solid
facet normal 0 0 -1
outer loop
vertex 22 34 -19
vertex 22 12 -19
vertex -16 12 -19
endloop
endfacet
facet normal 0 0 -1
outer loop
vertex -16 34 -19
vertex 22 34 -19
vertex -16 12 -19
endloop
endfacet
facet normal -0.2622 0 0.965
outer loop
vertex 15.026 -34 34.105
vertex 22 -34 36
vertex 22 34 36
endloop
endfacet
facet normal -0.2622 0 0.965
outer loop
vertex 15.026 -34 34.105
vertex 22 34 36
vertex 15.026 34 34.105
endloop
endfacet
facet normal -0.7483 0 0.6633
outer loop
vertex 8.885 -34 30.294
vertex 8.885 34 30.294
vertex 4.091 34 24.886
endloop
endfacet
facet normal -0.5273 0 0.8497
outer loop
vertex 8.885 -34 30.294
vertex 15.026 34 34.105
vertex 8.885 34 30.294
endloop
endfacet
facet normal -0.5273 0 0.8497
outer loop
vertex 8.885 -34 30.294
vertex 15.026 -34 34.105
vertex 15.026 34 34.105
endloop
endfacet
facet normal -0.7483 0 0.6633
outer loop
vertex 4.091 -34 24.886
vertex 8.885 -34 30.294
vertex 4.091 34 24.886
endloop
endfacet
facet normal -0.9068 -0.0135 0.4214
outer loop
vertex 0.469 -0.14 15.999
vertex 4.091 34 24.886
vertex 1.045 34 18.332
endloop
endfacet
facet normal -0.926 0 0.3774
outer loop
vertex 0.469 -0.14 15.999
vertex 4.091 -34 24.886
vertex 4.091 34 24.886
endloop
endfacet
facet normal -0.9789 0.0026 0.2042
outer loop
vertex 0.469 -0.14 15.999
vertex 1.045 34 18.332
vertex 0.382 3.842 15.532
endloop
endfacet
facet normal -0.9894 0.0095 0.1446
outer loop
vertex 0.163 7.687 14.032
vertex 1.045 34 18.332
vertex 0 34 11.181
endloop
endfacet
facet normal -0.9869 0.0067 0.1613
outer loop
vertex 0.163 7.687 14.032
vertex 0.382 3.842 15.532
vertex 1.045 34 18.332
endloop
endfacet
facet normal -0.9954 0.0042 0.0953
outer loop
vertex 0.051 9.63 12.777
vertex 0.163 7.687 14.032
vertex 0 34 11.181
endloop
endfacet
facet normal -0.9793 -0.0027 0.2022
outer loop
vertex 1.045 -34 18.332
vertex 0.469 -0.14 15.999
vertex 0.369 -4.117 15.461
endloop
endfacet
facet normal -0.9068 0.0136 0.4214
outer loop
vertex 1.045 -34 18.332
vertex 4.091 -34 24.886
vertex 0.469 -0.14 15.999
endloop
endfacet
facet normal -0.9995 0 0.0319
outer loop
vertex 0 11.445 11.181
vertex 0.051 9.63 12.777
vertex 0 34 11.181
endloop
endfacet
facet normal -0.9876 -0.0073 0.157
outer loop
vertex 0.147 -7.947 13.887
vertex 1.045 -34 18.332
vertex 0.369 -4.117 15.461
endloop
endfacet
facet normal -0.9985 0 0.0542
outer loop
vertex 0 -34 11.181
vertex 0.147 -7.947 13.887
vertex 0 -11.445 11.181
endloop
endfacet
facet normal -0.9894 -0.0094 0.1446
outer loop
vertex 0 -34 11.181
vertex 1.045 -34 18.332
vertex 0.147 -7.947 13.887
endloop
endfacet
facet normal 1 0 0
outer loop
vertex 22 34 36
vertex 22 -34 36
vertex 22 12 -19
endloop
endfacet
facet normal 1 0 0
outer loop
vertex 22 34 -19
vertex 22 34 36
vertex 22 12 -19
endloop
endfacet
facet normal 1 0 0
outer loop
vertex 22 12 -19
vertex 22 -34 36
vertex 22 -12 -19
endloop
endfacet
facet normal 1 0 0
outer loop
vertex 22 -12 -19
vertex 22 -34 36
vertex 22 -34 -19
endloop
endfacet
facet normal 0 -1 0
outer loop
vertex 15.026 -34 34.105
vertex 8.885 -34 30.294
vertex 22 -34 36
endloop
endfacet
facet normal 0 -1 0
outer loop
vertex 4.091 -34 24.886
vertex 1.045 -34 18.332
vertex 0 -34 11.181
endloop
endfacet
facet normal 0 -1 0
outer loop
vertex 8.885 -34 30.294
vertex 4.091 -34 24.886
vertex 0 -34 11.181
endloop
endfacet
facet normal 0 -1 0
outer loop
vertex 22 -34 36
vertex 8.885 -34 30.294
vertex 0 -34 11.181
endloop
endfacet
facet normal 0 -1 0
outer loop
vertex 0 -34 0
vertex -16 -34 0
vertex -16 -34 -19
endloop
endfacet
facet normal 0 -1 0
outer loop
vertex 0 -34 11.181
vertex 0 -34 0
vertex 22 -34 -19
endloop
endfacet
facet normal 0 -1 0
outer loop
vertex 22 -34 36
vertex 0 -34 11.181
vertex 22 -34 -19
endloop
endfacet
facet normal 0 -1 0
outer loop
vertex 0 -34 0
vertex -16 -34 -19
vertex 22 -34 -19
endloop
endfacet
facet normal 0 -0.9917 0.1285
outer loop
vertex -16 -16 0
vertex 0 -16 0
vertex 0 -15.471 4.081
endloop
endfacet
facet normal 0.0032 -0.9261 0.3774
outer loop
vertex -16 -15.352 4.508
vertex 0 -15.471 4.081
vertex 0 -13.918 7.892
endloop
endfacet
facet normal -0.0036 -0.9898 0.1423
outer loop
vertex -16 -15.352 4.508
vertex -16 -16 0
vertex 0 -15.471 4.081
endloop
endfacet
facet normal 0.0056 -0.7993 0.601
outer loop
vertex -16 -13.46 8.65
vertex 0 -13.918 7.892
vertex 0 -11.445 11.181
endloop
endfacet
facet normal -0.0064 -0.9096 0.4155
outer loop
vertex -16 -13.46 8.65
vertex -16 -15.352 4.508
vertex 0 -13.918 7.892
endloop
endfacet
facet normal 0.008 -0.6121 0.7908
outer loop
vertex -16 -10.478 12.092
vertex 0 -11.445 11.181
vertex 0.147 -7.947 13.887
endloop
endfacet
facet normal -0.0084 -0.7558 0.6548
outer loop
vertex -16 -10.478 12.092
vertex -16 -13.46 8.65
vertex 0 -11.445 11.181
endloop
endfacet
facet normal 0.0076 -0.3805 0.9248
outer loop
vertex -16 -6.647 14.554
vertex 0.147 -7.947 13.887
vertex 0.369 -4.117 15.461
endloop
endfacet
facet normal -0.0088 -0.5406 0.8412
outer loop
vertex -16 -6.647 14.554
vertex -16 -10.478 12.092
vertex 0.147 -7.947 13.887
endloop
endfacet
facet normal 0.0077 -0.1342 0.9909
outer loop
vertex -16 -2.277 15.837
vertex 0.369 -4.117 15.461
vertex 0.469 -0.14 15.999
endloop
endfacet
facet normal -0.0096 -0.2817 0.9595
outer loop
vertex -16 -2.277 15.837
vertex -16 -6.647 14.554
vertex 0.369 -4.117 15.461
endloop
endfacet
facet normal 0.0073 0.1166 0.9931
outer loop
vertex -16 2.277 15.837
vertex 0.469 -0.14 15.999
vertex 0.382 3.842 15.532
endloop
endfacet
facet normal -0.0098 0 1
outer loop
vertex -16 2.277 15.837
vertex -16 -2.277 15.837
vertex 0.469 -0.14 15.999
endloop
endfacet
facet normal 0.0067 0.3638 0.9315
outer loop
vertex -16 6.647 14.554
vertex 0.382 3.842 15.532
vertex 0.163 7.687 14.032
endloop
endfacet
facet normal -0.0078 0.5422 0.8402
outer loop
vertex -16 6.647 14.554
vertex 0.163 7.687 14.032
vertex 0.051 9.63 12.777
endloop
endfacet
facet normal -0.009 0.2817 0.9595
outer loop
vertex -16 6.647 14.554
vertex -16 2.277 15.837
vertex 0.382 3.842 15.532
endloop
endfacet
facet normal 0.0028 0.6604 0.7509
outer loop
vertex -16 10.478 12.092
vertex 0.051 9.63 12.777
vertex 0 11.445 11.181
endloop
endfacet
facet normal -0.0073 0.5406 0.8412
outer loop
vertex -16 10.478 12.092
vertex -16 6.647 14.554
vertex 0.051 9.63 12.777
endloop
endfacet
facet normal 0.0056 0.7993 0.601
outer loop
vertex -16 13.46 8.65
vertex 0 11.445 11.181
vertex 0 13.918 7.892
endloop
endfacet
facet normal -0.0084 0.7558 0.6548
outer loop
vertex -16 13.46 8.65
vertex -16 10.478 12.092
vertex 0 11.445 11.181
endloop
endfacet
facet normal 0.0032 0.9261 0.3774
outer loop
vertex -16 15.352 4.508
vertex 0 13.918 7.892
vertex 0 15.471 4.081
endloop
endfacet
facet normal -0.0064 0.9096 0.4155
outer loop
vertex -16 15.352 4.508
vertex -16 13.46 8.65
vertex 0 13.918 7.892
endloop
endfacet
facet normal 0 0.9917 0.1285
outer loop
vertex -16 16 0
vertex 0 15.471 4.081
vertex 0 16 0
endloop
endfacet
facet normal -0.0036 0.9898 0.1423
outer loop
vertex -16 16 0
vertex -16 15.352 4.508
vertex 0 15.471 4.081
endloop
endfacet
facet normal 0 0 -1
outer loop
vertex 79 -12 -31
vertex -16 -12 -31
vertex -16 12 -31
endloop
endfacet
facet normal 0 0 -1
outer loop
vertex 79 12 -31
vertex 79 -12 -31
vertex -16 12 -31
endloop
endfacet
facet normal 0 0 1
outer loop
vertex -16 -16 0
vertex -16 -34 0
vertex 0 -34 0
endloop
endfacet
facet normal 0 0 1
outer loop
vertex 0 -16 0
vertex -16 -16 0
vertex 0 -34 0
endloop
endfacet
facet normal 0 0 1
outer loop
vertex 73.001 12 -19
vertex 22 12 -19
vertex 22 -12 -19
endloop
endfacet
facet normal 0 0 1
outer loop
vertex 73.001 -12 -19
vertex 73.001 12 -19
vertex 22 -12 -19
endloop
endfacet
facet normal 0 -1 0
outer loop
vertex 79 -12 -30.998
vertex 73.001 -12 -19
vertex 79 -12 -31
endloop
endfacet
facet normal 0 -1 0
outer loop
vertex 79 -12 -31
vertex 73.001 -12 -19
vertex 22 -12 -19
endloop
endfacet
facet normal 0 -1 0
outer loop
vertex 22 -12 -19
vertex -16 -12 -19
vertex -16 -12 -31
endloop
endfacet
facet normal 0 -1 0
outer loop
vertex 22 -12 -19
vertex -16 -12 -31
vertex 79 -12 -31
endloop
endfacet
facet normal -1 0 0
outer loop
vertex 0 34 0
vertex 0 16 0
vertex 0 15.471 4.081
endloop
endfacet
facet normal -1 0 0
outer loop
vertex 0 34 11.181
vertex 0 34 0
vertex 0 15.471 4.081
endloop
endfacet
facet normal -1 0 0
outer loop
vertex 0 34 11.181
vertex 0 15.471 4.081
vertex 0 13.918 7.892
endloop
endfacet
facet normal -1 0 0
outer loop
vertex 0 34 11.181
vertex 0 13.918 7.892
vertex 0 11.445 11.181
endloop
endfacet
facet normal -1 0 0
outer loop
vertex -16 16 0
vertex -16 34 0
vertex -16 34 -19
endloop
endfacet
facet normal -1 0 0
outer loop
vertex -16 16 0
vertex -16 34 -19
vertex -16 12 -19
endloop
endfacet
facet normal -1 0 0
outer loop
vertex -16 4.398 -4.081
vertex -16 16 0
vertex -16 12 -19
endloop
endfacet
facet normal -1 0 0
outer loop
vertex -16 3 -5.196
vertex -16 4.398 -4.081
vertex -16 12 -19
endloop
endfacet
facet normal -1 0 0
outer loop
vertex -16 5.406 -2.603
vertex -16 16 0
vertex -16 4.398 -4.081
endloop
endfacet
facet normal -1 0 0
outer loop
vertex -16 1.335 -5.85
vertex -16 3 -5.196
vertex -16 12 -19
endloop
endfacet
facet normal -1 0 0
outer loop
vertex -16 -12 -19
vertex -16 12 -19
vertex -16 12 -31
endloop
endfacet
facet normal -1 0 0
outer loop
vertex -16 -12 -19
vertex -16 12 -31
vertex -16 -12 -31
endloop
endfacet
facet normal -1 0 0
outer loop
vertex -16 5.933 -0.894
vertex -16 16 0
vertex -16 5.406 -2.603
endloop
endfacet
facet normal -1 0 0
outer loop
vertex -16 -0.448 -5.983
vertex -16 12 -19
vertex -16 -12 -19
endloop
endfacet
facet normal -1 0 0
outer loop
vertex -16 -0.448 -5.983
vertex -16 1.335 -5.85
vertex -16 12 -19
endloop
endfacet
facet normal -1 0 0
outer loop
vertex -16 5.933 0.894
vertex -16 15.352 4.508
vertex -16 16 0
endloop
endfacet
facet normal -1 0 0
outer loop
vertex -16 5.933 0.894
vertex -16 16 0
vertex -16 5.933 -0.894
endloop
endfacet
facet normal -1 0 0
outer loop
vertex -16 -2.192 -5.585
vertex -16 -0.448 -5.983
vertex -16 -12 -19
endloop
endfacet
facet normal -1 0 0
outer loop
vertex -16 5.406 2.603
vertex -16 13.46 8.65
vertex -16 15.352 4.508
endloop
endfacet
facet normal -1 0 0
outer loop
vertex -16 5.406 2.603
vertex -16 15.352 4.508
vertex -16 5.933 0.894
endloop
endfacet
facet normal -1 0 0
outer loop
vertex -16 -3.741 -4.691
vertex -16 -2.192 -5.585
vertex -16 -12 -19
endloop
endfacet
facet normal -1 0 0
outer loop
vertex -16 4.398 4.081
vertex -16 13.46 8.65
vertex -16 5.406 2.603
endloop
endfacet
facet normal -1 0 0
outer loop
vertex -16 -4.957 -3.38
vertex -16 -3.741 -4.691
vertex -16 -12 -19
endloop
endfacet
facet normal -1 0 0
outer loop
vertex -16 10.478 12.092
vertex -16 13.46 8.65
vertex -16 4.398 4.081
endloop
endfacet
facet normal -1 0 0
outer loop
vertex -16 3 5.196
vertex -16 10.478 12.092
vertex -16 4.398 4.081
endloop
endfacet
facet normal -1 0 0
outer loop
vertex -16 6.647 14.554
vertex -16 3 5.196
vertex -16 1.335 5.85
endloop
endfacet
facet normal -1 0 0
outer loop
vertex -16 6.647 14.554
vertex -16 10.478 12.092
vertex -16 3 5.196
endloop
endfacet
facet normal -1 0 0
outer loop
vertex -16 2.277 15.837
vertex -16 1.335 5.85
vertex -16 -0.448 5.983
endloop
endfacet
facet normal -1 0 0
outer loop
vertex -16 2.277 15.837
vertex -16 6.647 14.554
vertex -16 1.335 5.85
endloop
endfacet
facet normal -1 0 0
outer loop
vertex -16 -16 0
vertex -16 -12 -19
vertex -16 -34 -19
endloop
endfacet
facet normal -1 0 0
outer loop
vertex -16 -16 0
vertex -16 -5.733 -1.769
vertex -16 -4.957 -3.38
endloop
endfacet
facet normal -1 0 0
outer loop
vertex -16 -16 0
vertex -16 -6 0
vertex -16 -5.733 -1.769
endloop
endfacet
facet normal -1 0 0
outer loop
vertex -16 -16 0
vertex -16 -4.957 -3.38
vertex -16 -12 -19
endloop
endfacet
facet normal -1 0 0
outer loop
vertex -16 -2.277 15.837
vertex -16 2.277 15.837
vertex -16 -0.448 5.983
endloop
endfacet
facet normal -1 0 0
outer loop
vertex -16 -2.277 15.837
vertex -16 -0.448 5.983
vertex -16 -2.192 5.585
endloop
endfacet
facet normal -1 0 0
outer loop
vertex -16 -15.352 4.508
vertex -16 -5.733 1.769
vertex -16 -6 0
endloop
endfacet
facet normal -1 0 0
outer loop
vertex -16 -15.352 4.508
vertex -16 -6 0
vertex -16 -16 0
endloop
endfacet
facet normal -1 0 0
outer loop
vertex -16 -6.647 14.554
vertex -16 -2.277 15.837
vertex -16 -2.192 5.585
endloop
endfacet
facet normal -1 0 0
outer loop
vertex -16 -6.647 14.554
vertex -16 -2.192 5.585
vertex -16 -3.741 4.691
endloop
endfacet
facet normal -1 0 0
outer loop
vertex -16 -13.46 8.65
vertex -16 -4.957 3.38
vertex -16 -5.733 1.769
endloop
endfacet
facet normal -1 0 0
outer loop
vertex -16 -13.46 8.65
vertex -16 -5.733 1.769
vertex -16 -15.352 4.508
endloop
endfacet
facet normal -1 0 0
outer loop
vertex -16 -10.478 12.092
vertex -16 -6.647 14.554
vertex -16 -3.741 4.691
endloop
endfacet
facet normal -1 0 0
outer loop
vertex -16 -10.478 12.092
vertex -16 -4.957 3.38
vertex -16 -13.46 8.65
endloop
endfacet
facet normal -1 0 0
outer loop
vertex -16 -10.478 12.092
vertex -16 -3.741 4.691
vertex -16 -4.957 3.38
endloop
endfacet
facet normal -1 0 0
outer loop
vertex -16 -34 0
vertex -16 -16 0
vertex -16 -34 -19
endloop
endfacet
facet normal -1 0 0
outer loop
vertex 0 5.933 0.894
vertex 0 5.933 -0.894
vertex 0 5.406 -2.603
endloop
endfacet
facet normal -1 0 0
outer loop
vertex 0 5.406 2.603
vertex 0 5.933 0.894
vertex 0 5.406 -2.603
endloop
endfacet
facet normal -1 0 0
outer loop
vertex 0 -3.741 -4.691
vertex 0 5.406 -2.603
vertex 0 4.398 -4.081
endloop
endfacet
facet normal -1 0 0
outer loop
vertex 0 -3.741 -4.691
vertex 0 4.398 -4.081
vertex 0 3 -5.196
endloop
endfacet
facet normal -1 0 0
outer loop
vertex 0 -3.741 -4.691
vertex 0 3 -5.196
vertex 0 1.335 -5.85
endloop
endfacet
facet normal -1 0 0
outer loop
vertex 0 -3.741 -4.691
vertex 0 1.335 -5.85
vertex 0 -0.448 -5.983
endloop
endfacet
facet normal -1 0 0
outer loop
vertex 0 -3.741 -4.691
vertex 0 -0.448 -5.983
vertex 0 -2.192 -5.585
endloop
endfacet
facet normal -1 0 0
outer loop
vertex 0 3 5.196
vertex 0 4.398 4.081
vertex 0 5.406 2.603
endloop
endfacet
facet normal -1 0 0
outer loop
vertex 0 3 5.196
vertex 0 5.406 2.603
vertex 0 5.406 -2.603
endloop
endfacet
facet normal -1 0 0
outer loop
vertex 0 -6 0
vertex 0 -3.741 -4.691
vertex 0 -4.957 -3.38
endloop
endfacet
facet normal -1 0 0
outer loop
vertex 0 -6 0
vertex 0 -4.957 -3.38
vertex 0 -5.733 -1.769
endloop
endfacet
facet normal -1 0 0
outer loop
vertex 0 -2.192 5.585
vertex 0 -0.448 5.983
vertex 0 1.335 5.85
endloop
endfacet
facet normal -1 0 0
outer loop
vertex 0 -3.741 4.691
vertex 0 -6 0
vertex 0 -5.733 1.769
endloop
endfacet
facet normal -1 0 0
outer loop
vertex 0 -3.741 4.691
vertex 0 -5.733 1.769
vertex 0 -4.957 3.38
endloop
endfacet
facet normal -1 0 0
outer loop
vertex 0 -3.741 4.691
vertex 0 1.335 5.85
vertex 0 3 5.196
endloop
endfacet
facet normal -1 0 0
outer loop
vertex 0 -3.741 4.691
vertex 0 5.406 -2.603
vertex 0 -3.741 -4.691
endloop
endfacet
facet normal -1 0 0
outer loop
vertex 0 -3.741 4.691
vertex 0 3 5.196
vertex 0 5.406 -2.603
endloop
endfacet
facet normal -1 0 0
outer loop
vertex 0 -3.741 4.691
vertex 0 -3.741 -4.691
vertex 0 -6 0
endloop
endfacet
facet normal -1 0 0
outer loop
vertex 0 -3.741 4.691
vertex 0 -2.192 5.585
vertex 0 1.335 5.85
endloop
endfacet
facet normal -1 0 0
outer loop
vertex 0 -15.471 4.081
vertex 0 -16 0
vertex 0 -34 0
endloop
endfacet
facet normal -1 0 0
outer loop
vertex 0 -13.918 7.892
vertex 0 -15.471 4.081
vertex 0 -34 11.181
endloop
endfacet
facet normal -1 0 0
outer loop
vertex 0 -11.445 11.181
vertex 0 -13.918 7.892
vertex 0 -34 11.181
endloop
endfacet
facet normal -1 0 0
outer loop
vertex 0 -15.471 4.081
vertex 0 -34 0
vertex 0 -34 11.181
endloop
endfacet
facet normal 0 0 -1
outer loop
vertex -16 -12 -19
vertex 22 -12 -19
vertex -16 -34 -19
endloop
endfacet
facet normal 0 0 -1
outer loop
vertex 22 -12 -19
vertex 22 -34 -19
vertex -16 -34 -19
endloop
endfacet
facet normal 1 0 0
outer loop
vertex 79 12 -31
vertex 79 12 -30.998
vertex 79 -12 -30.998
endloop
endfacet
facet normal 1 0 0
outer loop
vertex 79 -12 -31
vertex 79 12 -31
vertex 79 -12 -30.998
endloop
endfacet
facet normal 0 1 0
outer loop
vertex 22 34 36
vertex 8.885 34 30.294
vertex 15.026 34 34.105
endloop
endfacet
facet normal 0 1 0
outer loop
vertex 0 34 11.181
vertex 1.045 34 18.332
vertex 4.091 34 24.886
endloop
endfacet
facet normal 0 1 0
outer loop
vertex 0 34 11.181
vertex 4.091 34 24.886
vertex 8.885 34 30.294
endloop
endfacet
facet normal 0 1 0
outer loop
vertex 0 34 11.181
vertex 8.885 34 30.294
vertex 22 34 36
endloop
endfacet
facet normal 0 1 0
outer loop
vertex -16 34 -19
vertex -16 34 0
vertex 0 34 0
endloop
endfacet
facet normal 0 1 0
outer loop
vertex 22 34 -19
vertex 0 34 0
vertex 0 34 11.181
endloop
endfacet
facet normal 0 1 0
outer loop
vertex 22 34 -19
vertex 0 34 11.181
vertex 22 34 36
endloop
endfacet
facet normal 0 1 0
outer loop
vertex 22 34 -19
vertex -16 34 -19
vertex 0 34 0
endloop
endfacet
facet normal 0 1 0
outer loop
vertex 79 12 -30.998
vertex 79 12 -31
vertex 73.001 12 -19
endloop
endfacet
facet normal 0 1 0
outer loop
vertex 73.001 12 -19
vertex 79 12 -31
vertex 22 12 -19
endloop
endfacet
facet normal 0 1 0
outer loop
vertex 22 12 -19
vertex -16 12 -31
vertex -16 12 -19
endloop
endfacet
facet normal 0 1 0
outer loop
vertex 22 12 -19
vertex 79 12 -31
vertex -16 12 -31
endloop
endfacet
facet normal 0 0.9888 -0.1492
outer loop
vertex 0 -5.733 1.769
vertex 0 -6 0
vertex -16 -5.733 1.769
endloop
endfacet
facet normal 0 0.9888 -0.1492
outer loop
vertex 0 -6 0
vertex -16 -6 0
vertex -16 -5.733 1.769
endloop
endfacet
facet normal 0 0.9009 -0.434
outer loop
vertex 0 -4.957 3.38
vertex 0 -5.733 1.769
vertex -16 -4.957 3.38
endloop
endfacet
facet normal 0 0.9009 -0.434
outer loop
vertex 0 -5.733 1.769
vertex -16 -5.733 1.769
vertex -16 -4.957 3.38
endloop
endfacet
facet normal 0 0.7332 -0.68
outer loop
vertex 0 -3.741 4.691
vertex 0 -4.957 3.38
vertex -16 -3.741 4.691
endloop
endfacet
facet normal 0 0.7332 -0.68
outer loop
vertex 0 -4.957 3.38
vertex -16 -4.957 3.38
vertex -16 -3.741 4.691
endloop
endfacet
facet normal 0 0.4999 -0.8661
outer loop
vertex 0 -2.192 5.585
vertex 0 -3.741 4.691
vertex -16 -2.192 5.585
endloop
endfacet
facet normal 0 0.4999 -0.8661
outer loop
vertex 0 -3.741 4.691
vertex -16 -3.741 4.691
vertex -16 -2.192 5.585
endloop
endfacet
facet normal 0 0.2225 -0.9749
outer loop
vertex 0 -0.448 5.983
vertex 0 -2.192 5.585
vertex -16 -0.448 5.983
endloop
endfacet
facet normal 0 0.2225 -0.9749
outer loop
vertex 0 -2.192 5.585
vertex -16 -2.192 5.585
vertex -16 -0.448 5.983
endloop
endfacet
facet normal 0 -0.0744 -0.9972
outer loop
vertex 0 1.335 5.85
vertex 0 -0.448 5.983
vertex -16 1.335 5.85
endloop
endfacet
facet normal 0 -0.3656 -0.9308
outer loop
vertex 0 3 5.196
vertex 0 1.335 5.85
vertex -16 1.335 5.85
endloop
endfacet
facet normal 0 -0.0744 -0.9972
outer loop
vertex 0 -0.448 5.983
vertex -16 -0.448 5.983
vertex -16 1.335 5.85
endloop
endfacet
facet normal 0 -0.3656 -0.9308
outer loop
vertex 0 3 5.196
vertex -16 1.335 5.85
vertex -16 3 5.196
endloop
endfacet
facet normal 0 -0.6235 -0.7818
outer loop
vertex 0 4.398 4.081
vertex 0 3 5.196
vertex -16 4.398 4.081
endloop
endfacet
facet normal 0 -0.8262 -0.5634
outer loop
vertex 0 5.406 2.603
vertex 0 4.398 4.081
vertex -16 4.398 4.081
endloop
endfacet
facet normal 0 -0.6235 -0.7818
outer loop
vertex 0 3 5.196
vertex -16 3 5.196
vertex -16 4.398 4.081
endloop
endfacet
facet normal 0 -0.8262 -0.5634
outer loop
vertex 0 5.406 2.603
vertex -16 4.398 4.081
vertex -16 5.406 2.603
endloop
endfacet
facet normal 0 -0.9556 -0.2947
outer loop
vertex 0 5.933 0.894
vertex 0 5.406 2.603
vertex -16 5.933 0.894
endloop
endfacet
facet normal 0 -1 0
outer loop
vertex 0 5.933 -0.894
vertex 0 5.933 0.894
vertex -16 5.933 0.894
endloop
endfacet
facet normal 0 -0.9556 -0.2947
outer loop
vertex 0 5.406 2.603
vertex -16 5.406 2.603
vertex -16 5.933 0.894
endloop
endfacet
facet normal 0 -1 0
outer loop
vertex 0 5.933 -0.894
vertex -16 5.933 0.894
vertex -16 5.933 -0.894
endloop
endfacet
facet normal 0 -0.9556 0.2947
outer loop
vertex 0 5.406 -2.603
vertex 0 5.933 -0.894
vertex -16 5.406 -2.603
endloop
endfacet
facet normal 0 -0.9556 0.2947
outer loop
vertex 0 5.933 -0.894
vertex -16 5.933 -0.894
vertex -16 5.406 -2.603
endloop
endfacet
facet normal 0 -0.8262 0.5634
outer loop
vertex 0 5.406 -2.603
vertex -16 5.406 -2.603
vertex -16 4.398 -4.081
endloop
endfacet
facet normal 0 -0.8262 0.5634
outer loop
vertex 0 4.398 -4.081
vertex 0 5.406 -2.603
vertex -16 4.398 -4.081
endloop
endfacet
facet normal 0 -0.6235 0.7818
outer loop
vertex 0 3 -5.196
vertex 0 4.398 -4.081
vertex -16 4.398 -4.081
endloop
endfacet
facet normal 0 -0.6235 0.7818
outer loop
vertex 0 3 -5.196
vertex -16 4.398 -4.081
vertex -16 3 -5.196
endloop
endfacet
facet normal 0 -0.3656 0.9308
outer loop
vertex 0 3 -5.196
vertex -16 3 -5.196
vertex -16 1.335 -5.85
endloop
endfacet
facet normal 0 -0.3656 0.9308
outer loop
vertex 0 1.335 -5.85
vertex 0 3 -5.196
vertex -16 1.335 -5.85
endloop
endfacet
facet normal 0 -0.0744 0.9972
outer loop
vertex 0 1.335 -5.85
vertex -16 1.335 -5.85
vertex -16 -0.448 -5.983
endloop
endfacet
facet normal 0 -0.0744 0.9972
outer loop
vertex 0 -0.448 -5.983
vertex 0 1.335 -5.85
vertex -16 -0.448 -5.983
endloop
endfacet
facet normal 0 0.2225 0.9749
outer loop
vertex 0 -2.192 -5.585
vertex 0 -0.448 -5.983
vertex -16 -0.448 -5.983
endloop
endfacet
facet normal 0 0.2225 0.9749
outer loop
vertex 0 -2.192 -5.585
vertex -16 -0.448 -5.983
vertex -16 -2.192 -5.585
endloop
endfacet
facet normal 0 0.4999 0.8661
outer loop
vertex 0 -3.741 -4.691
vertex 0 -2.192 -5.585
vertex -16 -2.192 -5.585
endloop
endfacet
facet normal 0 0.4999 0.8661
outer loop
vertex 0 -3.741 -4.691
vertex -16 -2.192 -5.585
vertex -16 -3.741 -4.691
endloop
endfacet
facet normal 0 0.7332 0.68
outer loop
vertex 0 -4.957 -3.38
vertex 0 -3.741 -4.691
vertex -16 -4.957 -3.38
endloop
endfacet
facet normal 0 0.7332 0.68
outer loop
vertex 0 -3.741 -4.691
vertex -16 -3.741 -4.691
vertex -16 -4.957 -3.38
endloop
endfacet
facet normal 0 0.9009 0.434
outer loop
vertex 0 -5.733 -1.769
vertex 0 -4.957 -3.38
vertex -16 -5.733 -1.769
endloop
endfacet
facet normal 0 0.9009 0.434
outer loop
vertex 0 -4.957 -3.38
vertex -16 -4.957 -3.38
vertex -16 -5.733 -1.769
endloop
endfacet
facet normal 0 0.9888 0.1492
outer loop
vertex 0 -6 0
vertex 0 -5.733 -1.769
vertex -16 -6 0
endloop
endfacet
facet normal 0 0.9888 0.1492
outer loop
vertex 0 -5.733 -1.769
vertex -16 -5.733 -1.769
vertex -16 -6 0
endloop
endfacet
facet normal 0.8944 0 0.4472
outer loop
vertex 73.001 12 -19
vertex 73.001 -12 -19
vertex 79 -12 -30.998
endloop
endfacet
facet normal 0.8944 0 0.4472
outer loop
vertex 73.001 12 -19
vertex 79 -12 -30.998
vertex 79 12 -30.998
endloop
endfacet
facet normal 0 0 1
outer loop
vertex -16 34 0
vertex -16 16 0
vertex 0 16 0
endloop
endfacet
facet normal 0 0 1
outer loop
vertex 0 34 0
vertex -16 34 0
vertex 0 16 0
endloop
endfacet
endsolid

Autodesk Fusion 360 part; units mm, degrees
sketch "Sketch1" plane through (0, 0, 0) normal (0, 1, 0) x (1, 0, 0)
  line L0 (22, 19) -> (-16, 19)
  line L1 (-16, 19) -> (-16, 0)
  line L2 (-16, 0) -> (0, 0)
  line L3 (0, 0) -> (0, -11.1807)
  arc A0 (0, -11.1807) -> (22, -36) centre (25, -11.1807) ccw
  line L4 (22, -36) -> (22, 19)
  dimension "d1" = 55
  dimension "d2" = 38
  dimension "d3" = 25
  dimension "d4" = 16
  dimension "d5" = 19
extrude "Extrude1" add sketch "Sketch1" along normal blind 34 and the other way blind 34
sketch "Sketch2" plane through (-16, 0, 0) normal (-1, 0, 0) x (0, -1, 0)
  line L0 (34, 0) -> (-34, 0)
  line L1 (-34, 0) -> (-34, -19)
  line L2 (-34, -19) -> (34, -19)
  line L3 (34, -19) -> (34, 0)
  line L4 (-12, -19) -> (12, -19)
  line L5 (12, -19) -> (12, -31)
  line L6 (12, -31) -> (-12, -31)
  line L7 (-12, -31) -> (-12, -19)
  dimension "d10" = 12
  dimension "d11" = 24
  dimension "d12" = 22
extrude "Extrude2" add sketch "Sketch2" against normal blind 95 contours L2 L4 L5 L6 L7
chamfer "Chamfer1" distance 12 distance2 6 1 edges at (79, 0, -19) measured on face at (79, 4, -23)
sketch "Sketch3" plane through (-16, 0, 0) normal (-1, 0, 0) x (0, -1, 0)
  line L0 (34, 0) -> (-34, 0)
  line L1 (-34, 0) -> (-34, -19)
  line L2 (-34, -19) -> (-12, -19)
  line L3 (-12, -19) -> (-12, -31)
  line L4 (-12, -31) -> (12, -31)
  line L5 (12, -31) -> (12, -19)
  line L6 (12, -19) -> (34, -19)
  line L7 (34, -19) -> (34, 0)
  arc A0 (16, 0) -> (-16, 0) centre (0, 0) ccw
  dimension "d17" = 32
extrude "Extrude3" add sketch "Sketch3" along normal up to surface contours L0 A0 end surface at (1.4183, 11.3333, 19.4813)
sketch "Sketch4" plane through (-16, 0, 0) normal (-1, 0, 0) x (0, -1, 0)
  line L0 (34, 0) -> (16, 0)
  arc A0 (16, 0) -> (-16, 0) centre (0, 0) ccw
  line L1 (-16, 0) -> (-34, 0)
  line L2 (-34, 0) -> (-34, -19)
  line L3 (-34, -19) -> (-12, -19)
  line L4 (-12, -19) -> (-12, -31)
  line L5 (-12, -31) -> (12, -31)
  line L6 (12, -31) -> (12, -19)
  line L7 (12, -19) -> (34, -19)
  line L8 (34, -19) -> (34, 0)
  circle A1 centre (0, 0) radius 6
  dimension "d21" = 12
extrude "Extrude4" cut sketch "Sketch4" against normal blind 16 contours A1
